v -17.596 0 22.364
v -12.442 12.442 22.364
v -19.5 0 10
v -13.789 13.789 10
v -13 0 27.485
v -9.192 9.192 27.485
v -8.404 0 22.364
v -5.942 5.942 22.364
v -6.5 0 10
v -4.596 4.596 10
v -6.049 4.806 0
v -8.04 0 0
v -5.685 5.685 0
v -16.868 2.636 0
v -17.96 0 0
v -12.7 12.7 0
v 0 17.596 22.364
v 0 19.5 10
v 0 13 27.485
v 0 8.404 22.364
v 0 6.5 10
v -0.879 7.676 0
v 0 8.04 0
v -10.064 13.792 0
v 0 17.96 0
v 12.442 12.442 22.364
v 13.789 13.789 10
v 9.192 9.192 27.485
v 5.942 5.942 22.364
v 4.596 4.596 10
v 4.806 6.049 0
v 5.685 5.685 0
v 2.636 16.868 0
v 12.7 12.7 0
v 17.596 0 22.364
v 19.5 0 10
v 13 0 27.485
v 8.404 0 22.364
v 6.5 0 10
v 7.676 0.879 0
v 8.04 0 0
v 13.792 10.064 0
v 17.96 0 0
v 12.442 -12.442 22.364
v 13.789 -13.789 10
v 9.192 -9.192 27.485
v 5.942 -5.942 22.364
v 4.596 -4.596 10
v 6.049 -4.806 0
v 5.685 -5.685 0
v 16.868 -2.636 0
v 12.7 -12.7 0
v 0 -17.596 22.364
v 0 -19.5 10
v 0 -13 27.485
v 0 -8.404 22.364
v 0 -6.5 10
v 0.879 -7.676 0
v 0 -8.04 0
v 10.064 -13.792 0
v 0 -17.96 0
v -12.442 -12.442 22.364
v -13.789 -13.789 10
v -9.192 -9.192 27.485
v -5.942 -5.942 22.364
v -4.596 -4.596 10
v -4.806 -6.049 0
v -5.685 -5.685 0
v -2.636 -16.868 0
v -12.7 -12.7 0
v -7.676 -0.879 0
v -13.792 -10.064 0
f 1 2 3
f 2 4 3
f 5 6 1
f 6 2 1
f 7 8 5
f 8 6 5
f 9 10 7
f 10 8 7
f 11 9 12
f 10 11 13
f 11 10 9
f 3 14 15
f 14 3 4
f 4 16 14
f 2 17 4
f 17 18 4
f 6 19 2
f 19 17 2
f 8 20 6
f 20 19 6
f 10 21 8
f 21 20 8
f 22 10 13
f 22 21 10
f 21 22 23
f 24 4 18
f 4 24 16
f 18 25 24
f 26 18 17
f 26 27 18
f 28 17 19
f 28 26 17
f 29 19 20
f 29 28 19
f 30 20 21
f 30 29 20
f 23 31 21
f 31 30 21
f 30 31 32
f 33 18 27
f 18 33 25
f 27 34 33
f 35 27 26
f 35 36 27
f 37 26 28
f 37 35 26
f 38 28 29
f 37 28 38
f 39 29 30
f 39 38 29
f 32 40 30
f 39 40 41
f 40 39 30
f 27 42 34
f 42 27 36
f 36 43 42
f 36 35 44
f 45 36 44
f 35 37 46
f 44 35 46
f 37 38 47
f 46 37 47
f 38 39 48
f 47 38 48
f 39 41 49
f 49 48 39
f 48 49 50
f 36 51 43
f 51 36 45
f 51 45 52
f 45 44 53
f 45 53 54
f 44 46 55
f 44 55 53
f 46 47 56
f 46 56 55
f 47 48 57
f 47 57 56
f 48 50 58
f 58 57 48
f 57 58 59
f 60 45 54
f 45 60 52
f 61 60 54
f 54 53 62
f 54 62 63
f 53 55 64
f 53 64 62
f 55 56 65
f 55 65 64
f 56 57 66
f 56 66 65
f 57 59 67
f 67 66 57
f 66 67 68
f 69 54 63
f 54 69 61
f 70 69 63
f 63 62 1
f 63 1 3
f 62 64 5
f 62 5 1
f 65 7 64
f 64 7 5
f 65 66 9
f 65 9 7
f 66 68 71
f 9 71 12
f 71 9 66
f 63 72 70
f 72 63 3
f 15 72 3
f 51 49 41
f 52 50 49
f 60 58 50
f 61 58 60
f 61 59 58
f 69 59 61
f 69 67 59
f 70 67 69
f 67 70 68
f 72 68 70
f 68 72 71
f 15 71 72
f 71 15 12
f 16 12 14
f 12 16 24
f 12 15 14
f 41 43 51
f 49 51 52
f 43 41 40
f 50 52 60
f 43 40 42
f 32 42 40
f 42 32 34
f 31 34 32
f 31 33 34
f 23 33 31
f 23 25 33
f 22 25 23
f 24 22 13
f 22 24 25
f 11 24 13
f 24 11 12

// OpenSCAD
$fn = 8;
//use <../torus.scad>
/** custom torums */
module custom_torus(r,d){
		rotate_extrude(convexity = 10)
				translate([d/2-r, 0, 0])
							child();
}

/**
does not need to be parametrized... i think.

it is made of a torus where R=14, r=elipsis( ... no idea how to describe
elipsis matematicaly at this hour of the night, so let's just say larger
side diameter=35 and smaller side diameter=13. then 5mm on the bottom cut
out.

hum... the tops are a fatter... need a way to do poly rotate extrude...
but i think that should work. let's print and see...

*/


difference(){
	// the oval torus
	translate([0,0,10])
	custom_torus(r=15/2, d=41)
		scale([1,2.69,1])
			circle(r=13/2);

	// a block in the end to cut the bottom
	translate([-50,-50,-100])
		cube([100, 100, 100]);
}
/*
13 - 35
100 - x
3500 = 13x
x = 269.
*/
